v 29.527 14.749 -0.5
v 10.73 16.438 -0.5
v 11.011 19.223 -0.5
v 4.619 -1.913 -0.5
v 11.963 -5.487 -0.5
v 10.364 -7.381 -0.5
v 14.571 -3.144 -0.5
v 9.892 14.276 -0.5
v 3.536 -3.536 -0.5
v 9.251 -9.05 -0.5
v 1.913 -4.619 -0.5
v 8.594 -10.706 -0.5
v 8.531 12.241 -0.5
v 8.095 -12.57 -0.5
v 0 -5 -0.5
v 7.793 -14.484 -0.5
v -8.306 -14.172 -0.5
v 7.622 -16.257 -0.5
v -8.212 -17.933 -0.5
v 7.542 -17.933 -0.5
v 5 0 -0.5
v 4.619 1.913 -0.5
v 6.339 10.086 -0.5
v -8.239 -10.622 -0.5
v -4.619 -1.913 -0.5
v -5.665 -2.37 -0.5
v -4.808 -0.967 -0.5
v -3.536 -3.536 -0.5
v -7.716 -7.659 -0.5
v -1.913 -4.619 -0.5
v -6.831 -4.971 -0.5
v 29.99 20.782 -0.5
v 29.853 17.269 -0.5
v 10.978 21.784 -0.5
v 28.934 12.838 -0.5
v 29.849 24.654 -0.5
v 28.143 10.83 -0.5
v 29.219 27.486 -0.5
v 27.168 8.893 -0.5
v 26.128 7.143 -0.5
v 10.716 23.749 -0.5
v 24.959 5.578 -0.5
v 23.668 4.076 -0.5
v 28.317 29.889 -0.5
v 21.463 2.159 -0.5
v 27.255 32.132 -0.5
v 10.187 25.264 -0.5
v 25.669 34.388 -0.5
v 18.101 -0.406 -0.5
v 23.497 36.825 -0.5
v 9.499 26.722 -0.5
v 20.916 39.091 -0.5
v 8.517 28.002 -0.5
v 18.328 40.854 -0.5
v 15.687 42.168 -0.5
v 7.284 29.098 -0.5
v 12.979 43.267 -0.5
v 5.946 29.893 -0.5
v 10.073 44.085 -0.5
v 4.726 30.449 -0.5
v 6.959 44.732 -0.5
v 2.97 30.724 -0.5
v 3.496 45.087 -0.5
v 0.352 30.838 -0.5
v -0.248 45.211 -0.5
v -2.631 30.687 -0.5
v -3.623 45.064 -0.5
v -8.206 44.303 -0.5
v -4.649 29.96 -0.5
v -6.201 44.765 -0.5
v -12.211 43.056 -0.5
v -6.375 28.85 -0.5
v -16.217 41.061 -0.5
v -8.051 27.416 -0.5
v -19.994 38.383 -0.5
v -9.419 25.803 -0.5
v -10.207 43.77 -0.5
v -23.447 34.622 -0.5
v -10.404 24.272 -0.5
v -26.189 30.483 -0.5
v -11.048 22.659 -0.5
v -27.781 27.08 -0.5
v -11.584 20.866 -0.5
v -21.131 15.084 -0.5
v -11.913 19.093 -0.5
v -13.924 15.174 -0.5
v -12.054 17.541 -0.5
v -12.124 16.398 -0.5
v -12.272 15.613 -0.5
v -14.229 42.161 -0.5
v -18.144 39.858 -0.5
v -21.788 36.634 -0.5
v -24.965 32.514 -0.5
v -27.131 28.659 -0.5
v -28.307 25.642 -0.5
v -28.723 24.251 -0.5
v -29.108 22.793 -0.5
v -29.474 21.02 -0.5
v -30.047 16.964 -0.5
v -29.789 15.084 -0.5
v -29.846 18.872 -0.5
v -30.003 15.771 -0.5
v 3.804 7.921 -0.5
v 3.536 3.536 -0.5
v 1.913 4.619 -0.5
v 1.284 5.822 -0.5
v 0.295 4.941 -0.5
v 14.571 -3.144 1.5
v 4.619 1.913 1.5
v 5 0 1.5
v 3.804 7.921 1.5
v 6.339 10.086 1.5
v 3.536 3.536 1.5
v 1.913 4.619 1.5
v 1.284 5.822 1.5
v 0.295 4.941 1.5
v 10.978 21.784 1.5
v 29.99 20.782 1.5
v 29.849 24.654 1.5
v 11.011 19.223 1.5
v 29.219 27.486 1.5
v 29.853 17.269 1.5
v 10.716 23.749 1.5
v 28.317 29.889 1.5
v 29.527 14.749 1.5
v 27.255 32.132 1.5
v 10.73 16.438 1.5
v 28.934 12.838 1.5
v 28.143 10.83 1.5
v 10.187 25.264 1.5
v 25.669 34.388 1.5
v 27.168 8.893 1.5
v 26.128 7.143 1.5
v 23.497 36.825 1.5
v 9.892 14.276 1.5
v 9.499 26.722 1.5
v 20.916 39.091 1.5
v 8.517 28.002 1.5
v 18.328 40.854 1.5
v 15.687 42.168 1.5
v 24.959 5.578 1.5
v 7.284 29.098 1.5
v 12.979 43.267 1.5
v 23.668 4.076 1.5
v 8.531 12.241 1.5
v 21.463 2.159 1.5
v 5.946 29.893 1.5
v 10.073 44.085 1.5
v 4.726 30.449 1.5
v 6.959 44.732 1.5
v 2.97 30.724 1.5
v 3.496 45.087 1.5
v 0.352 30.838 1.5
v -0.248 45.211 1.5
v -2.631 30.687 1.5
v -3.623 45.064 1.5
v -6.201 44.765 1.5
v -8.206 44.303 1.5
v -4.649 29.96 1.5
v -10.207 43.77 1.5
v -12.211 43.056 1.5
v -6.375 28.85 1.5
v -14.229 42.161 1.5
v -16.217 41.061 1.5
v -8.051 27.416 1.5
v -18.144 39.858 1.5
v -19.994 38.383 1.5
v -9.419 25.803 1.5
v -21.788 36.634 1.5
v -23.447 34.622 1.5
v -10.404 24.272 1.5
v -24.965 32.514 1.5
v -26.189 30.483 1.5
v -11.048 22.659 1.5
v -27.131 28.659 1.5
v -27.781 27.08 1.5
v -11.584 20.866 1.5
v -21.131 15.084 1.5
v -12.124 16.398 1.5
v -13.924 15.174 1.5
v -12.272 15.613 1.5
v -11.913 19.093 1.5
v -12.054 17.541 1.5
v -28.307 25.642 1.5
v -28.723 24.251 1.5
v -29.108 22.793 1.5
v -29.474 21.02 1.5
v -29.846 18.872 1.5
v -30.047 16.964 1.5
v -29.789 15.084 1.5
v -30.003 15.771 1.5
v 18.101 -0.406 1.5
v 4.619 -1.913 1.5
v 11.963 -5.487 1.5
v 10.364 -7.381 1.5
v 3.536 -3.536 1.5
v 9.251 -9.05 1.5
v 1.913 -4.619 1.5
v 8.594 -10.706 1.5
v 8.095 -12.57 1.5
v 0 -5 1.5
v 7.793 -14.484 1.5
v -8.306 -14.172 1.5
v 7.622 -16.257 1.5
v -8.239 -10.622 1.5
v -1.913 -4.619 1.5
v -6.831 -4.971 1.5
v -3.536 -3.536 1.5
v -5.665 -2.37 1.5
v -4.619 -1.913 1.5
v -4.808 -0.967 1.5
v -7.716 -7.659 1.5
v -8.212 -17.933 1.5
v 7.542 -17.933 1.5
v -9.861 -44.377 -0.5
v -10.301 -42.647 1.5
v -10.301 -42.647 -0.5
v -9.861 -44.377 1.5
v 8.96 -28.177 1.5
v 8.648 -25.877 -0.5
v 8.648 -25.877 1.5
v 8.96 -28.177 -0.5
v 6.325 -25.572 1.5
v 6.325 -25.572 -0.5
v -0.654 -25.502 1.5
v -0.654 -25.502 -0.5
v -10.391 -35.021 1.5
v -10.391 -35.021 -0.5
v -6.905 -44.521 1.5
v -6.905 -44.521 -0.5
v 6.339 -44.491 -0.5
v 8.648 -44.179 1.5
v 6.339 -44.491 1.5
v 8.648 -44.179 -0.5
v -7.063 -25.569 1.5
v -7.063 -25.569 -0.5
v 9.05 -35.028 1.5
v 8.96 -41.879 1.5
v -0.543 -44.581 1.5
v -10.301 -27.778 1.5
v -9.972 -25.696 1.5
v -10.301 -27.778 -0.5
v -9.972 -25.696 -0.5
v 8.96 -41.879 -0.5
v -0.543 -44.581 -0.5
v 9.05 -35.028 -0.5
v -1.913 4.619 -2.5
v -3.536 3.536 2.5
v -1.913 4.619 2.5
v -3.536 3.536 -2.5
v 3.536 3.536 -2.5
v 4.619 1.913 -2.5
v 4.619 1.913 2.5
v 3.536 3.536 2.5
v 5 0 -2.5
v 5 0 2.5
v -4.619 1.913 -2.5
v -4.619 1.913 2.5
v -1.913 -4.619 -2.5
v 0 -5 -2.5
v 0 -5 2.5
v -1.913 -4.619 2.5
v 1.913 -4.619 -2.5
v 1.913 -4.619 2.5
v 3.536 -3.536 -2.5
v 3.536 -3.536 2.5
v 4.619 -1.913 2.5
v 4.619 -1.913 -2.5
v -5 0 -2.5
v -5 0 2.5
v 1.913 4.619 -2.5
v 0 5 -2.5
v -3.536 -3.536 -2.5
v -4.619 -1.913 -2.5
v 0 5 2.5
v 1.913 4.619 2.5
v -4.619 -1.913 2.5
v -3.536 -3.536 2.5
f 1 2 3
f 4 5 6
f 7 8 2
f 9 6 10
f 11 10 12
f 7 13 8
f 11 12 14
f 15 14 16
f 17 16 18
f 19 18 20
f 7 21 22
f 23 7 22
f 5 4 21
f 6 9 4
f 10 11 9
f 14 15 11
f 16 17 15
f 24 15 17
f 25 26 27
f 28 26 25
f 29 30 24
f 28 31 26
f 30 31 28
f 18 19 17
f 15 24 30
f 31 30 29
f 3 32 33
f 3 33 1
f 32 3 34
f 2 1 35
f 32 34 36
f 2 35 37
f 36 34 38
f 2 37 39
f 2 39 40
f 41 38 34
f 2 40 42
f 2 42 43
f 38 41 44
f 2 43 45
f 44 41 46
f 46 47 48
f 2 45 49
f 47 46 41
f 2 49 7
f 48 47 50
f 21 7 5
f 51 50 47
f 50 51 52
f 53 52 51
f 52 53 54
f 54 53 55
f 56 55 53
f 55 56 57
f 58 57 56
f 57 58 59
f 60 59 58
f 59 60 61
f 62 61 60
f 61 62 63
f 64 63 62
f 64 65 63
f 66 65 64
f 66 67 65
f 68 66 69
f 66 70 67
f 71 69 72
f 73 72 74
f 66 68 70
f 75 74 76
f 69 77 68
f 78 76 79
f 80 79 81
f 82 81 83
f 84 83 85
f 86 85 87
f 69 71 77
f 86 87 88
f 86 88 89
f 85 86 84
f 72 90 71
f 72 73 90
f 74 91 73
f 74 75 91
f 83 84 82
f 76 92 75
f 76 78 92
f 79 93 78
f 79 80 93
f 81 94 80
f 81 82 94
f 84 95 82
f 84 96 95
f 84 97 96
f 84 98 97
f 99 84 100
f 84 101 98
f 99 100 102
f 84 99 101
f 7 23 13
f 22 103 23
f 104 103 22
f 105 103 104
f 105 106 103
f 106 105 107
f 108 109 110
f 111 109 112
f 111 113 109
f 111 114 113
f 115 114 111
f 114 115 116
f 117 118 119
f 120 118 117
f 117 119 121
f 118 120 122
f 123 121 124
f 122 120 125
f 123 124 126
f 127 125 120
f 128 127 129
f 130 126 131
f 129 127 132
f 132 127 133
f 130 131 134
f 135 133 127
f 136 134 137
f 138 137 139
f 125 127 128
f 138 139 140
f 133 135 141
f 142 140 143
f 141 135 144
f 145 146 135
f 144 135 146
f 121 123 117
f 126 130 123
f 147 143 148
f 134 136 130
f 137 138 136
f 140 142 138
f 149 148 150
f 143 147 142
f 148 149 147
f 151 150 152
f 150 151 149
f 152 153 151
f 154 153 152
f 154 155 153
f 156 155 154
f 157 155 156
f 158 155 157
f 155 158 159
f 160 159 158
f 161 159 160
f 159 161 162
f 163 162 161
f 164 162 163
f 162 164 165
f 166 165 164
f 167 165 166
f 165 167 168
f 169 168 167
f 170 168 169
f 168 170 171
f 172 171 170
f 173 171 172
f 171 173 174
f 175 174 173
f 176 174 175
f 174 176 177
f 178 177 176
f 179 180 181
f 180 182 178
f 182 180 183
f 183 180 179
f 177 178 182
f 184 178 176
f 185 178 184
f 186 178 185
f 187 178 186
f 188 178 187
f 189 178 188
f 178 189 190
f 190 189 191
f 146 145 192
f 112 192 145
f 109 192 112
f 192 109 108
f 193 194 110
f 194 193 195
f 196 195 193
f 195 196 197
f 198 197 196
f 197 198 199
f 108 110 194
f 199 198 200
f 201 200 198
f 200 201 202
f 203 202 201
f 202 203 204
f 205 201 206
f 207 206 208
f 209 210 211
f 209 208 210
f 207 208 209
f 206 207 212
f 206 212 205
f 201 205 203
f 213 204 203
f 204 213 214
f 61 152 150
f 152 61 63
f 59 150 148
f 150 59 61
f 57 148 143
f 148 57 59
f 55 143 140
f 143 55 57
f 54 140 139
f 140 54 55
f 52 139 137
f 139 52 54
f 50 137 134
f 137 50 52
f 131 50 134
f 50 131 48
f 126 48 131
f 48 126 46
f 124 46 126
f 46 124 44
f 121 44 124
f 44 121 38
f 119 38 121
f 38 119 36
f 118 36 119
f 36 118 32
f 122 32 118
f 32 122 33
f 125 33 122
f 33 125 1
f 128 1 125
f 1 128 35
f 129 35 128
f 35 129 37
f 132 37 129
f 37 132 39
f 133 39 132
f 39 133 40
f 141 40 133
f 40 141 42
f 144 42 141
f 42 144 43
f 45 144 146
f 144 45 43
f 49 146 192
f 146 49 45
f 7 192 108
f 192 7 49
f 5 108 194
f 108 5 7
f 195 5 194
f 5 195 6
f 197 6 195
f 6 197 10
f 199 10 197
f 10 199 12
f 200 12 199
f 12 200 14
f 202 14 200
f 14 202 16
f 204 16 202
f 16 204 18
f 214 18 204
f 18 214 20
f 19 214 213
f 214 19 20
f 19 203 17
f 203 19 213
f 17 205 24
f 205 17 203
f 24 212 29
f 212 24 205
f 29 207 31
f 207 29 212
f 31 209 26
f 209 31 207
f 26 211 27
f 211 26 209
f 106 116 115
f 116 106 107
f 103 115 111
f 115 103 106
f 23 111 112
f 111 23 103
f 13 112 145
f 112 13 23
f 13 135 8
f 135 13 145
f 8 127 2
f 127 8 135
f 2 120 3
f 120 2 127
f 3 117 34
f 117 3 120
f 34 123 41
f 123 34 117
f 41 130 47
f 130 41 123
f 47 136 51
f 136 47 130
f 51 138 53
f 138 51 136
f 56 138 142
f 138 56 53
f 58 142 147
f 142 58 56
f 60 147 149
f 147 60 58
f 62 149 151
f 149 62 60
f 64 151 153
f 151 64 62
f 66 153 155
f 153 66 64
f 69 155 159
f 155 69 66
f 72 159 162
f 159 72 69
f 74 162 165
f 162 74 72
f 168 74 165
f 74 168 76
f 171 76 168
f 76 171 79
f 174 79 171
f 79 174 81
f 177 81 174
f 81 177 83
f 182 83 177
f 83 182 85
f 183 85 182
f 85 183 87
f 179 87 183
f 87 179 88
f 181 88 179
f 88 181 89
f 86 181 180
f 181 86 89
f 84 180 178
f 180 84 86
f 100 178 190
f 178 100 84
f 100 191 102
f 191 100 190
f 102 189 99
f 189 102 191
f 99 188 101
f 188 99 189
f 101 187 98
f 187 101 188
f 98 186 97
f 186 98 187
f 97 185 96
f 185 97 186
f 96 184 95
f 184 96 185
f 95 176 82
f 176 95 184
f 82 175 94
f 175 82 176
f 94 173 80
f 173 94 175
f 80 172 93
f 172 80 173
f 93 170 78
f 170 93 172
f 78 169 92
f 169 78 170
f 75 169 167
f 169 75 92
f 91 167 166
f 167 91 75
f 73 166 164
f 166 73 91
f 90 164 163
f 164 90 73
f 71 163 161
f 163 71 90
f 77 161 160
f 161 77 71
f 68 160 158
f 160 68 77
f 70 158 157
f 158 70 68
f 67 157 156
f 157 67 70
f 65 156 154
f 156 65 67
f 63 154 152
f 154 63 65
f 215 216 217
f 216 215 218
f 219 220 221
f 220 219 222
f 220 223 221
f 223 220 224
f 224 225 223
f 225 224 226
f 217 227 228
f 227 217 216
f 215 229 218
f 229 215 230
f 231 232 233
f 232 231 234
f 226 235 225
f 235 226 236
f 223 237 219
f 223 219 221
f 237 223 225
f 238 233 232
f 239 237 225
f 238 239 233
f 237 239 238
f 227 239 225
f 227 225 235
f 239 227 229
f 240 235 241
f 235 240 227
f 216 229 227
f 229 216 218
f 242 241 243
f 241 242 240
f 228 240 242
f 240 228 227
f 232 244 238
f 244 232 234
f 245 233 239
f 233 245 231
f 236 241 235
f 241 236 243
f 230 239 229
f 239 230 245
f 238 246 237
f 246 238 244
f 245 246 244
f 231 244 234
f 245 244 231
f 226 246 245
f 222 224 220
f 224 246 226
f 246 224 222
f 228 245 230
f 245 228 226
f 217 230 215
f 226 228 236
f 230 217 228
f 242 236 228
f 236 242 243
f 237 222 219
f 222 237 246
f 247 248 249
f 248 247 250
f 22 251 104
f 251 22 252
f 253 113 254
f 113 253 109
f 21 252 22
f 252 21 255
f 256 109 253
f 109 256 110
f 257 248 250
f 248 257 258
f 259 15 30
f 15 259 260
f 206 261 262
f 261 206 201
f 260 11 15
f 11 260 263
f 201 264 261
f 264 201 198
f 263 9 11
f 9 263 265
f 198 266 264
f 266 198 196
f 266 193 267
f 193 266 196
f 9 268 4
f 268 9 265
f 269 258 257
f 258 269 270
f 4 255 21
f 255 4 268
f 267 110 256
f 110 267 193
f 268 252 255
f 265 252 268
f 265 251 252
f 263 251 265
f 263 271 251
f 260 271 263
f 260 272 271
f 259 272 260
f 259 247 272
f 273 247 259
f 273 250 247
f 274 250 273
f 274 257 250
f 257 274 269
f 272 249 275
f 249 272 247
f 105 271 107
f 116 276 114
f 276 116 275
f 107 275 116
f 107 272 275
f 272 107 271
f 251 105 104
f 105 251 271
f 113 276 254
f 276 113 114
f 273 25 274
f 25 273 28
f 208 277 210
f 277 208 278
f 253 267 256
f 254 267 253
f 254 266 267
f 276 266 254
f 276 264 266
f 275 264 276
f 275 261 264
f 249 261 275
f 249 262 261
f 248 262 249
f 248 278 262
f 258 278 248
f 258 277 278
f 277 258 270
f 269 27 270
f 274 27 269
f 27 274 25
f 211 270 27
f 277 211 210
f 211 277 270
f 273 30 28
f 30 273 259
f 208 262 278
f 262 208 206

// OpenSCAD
//------------------------------------------------------------
//	Stencil-o-Matic (modified for RossRobotics)
//
//	input comes from:
//	http://chaaawa.com/stencil_factory/
//
//	http://thingiverse.com/Benjamin
//	http://www.thingiverse.com/thing:55821
//------------------------------------------------------------

// preview[view:south, tilt:top]

// paste here after "Convert&Copy"
input = "no_input";

stencil_thickness = 1;
stencil_width = 80;
//for margin
margin = 10;

// If you don't want to center
offX = 0;
offY = 0;

module void() {}

cylinder(5,5,5, center=true);

dispo_width = stencil_width - 2*margin;

points_array = (input=="no_input"? [[179,268],[[199.26,15.12],[189.19,15.56],[181.5,16.45],[175.52,17.83],[169.55,19.42],[163.57,21.55],[157.55,24.22],[151.62,27.5],[145.87,31.09],[140.35,35.49],[135,40.71],[130.05,46.71],[125.52,53],[121.87,59.06],[119.06,64.5],[117.12,69.21],[115.55,73.5],[114.31,77.65],[113.16,82],[112.07,87.29],[110.96,93.7],[110.36,99.39],[110.49,102.95],[111.13,105],[136.96,105],[158.46,104.73],[163.39,103.42],[163.83,101.08],[164.04,97.67],[164.46,93.04],[165.44,87.75],[167.04,82.4],[168.96,77.59],[171.9,73.02],[175.98,68.21],[180.98,63.93],[186.13,60.62],[192.15,58.45],[201.05,58],[208.86,58.34],[214.1,59.16],[217.74,60.82],[221.73,63.19],[225.41,66.46],[228.34,70.28],[230.39,74.63],[231.97,79.15],[232.75,85.01],[232.85,92.65],[232.01,100.96],[229.51,107.41],[225.45,113.48],[218.91,119.91],[211.35,126.37],[203.83,132.63],[197.2,138.54],[191.77,144.13],[187.33,150.15],[183.1,157.07],[179.62,164.83],[176.98,172.85],[175.42,181.69],[175.22,192.28],[175.5,203.5],[199,203.5],[222.5,203.5],[222.74,198.5],[223.25,193.21],[224.15,187.5],[225.64,181.94],[227.6,177],[230.92,172.02],[235.69,166.37],[243.47,159.38],[254,151.21],[264.03,143.56],[270.61,137.84],[274.46,133.36],[277.95,128.69],[281.05,123.47],[283.96,117.69],[286.32,111.7],[288.09,106],[289.06,98.48],[289.47,88],[289.05,76.45],[287.17,68],[284.48,60.83],[281.31,54.14],[276.58,47.41],[270.1,40.14],[262.4,33.38],[254.68,28.12],[246.8,24.2],[238.72,20.92],[230.05,18.48],[220.76,16.55],[210.43,15.49],[199.26,15.12]],[[198.05,226.08],[178.93,226.28],[170.25,226.66],[169.27,232.87],[169,254.48],[169.27,277.23],[170.58,282.39],[179.4,282.82],[198.38,283],[218.91,282.73],[225.8,281.8],[226.73,274.94],[227,254.5],[226.73,234.06],[225.8,227.2],[218.87,226.29],[198.05,226.08]]]: input);

input_width = points_array[0][0];
input_height= points_array[0][1];
sTrace = dispo_width/input_width;
stencil_height = input_height*sTrace + 2*margin;


	translate([offX, offY, -stencil_thickness/2])
	scale([sTrace, -sTrace, 1])
	translate([-200, -150, 0]) {
		union() {
			for (i = [1:len(points_array) -1] ) {
				linear_extrude(height=stencil_thickness*2) {polygon(points_array[i]);}
			}
		}
	}






